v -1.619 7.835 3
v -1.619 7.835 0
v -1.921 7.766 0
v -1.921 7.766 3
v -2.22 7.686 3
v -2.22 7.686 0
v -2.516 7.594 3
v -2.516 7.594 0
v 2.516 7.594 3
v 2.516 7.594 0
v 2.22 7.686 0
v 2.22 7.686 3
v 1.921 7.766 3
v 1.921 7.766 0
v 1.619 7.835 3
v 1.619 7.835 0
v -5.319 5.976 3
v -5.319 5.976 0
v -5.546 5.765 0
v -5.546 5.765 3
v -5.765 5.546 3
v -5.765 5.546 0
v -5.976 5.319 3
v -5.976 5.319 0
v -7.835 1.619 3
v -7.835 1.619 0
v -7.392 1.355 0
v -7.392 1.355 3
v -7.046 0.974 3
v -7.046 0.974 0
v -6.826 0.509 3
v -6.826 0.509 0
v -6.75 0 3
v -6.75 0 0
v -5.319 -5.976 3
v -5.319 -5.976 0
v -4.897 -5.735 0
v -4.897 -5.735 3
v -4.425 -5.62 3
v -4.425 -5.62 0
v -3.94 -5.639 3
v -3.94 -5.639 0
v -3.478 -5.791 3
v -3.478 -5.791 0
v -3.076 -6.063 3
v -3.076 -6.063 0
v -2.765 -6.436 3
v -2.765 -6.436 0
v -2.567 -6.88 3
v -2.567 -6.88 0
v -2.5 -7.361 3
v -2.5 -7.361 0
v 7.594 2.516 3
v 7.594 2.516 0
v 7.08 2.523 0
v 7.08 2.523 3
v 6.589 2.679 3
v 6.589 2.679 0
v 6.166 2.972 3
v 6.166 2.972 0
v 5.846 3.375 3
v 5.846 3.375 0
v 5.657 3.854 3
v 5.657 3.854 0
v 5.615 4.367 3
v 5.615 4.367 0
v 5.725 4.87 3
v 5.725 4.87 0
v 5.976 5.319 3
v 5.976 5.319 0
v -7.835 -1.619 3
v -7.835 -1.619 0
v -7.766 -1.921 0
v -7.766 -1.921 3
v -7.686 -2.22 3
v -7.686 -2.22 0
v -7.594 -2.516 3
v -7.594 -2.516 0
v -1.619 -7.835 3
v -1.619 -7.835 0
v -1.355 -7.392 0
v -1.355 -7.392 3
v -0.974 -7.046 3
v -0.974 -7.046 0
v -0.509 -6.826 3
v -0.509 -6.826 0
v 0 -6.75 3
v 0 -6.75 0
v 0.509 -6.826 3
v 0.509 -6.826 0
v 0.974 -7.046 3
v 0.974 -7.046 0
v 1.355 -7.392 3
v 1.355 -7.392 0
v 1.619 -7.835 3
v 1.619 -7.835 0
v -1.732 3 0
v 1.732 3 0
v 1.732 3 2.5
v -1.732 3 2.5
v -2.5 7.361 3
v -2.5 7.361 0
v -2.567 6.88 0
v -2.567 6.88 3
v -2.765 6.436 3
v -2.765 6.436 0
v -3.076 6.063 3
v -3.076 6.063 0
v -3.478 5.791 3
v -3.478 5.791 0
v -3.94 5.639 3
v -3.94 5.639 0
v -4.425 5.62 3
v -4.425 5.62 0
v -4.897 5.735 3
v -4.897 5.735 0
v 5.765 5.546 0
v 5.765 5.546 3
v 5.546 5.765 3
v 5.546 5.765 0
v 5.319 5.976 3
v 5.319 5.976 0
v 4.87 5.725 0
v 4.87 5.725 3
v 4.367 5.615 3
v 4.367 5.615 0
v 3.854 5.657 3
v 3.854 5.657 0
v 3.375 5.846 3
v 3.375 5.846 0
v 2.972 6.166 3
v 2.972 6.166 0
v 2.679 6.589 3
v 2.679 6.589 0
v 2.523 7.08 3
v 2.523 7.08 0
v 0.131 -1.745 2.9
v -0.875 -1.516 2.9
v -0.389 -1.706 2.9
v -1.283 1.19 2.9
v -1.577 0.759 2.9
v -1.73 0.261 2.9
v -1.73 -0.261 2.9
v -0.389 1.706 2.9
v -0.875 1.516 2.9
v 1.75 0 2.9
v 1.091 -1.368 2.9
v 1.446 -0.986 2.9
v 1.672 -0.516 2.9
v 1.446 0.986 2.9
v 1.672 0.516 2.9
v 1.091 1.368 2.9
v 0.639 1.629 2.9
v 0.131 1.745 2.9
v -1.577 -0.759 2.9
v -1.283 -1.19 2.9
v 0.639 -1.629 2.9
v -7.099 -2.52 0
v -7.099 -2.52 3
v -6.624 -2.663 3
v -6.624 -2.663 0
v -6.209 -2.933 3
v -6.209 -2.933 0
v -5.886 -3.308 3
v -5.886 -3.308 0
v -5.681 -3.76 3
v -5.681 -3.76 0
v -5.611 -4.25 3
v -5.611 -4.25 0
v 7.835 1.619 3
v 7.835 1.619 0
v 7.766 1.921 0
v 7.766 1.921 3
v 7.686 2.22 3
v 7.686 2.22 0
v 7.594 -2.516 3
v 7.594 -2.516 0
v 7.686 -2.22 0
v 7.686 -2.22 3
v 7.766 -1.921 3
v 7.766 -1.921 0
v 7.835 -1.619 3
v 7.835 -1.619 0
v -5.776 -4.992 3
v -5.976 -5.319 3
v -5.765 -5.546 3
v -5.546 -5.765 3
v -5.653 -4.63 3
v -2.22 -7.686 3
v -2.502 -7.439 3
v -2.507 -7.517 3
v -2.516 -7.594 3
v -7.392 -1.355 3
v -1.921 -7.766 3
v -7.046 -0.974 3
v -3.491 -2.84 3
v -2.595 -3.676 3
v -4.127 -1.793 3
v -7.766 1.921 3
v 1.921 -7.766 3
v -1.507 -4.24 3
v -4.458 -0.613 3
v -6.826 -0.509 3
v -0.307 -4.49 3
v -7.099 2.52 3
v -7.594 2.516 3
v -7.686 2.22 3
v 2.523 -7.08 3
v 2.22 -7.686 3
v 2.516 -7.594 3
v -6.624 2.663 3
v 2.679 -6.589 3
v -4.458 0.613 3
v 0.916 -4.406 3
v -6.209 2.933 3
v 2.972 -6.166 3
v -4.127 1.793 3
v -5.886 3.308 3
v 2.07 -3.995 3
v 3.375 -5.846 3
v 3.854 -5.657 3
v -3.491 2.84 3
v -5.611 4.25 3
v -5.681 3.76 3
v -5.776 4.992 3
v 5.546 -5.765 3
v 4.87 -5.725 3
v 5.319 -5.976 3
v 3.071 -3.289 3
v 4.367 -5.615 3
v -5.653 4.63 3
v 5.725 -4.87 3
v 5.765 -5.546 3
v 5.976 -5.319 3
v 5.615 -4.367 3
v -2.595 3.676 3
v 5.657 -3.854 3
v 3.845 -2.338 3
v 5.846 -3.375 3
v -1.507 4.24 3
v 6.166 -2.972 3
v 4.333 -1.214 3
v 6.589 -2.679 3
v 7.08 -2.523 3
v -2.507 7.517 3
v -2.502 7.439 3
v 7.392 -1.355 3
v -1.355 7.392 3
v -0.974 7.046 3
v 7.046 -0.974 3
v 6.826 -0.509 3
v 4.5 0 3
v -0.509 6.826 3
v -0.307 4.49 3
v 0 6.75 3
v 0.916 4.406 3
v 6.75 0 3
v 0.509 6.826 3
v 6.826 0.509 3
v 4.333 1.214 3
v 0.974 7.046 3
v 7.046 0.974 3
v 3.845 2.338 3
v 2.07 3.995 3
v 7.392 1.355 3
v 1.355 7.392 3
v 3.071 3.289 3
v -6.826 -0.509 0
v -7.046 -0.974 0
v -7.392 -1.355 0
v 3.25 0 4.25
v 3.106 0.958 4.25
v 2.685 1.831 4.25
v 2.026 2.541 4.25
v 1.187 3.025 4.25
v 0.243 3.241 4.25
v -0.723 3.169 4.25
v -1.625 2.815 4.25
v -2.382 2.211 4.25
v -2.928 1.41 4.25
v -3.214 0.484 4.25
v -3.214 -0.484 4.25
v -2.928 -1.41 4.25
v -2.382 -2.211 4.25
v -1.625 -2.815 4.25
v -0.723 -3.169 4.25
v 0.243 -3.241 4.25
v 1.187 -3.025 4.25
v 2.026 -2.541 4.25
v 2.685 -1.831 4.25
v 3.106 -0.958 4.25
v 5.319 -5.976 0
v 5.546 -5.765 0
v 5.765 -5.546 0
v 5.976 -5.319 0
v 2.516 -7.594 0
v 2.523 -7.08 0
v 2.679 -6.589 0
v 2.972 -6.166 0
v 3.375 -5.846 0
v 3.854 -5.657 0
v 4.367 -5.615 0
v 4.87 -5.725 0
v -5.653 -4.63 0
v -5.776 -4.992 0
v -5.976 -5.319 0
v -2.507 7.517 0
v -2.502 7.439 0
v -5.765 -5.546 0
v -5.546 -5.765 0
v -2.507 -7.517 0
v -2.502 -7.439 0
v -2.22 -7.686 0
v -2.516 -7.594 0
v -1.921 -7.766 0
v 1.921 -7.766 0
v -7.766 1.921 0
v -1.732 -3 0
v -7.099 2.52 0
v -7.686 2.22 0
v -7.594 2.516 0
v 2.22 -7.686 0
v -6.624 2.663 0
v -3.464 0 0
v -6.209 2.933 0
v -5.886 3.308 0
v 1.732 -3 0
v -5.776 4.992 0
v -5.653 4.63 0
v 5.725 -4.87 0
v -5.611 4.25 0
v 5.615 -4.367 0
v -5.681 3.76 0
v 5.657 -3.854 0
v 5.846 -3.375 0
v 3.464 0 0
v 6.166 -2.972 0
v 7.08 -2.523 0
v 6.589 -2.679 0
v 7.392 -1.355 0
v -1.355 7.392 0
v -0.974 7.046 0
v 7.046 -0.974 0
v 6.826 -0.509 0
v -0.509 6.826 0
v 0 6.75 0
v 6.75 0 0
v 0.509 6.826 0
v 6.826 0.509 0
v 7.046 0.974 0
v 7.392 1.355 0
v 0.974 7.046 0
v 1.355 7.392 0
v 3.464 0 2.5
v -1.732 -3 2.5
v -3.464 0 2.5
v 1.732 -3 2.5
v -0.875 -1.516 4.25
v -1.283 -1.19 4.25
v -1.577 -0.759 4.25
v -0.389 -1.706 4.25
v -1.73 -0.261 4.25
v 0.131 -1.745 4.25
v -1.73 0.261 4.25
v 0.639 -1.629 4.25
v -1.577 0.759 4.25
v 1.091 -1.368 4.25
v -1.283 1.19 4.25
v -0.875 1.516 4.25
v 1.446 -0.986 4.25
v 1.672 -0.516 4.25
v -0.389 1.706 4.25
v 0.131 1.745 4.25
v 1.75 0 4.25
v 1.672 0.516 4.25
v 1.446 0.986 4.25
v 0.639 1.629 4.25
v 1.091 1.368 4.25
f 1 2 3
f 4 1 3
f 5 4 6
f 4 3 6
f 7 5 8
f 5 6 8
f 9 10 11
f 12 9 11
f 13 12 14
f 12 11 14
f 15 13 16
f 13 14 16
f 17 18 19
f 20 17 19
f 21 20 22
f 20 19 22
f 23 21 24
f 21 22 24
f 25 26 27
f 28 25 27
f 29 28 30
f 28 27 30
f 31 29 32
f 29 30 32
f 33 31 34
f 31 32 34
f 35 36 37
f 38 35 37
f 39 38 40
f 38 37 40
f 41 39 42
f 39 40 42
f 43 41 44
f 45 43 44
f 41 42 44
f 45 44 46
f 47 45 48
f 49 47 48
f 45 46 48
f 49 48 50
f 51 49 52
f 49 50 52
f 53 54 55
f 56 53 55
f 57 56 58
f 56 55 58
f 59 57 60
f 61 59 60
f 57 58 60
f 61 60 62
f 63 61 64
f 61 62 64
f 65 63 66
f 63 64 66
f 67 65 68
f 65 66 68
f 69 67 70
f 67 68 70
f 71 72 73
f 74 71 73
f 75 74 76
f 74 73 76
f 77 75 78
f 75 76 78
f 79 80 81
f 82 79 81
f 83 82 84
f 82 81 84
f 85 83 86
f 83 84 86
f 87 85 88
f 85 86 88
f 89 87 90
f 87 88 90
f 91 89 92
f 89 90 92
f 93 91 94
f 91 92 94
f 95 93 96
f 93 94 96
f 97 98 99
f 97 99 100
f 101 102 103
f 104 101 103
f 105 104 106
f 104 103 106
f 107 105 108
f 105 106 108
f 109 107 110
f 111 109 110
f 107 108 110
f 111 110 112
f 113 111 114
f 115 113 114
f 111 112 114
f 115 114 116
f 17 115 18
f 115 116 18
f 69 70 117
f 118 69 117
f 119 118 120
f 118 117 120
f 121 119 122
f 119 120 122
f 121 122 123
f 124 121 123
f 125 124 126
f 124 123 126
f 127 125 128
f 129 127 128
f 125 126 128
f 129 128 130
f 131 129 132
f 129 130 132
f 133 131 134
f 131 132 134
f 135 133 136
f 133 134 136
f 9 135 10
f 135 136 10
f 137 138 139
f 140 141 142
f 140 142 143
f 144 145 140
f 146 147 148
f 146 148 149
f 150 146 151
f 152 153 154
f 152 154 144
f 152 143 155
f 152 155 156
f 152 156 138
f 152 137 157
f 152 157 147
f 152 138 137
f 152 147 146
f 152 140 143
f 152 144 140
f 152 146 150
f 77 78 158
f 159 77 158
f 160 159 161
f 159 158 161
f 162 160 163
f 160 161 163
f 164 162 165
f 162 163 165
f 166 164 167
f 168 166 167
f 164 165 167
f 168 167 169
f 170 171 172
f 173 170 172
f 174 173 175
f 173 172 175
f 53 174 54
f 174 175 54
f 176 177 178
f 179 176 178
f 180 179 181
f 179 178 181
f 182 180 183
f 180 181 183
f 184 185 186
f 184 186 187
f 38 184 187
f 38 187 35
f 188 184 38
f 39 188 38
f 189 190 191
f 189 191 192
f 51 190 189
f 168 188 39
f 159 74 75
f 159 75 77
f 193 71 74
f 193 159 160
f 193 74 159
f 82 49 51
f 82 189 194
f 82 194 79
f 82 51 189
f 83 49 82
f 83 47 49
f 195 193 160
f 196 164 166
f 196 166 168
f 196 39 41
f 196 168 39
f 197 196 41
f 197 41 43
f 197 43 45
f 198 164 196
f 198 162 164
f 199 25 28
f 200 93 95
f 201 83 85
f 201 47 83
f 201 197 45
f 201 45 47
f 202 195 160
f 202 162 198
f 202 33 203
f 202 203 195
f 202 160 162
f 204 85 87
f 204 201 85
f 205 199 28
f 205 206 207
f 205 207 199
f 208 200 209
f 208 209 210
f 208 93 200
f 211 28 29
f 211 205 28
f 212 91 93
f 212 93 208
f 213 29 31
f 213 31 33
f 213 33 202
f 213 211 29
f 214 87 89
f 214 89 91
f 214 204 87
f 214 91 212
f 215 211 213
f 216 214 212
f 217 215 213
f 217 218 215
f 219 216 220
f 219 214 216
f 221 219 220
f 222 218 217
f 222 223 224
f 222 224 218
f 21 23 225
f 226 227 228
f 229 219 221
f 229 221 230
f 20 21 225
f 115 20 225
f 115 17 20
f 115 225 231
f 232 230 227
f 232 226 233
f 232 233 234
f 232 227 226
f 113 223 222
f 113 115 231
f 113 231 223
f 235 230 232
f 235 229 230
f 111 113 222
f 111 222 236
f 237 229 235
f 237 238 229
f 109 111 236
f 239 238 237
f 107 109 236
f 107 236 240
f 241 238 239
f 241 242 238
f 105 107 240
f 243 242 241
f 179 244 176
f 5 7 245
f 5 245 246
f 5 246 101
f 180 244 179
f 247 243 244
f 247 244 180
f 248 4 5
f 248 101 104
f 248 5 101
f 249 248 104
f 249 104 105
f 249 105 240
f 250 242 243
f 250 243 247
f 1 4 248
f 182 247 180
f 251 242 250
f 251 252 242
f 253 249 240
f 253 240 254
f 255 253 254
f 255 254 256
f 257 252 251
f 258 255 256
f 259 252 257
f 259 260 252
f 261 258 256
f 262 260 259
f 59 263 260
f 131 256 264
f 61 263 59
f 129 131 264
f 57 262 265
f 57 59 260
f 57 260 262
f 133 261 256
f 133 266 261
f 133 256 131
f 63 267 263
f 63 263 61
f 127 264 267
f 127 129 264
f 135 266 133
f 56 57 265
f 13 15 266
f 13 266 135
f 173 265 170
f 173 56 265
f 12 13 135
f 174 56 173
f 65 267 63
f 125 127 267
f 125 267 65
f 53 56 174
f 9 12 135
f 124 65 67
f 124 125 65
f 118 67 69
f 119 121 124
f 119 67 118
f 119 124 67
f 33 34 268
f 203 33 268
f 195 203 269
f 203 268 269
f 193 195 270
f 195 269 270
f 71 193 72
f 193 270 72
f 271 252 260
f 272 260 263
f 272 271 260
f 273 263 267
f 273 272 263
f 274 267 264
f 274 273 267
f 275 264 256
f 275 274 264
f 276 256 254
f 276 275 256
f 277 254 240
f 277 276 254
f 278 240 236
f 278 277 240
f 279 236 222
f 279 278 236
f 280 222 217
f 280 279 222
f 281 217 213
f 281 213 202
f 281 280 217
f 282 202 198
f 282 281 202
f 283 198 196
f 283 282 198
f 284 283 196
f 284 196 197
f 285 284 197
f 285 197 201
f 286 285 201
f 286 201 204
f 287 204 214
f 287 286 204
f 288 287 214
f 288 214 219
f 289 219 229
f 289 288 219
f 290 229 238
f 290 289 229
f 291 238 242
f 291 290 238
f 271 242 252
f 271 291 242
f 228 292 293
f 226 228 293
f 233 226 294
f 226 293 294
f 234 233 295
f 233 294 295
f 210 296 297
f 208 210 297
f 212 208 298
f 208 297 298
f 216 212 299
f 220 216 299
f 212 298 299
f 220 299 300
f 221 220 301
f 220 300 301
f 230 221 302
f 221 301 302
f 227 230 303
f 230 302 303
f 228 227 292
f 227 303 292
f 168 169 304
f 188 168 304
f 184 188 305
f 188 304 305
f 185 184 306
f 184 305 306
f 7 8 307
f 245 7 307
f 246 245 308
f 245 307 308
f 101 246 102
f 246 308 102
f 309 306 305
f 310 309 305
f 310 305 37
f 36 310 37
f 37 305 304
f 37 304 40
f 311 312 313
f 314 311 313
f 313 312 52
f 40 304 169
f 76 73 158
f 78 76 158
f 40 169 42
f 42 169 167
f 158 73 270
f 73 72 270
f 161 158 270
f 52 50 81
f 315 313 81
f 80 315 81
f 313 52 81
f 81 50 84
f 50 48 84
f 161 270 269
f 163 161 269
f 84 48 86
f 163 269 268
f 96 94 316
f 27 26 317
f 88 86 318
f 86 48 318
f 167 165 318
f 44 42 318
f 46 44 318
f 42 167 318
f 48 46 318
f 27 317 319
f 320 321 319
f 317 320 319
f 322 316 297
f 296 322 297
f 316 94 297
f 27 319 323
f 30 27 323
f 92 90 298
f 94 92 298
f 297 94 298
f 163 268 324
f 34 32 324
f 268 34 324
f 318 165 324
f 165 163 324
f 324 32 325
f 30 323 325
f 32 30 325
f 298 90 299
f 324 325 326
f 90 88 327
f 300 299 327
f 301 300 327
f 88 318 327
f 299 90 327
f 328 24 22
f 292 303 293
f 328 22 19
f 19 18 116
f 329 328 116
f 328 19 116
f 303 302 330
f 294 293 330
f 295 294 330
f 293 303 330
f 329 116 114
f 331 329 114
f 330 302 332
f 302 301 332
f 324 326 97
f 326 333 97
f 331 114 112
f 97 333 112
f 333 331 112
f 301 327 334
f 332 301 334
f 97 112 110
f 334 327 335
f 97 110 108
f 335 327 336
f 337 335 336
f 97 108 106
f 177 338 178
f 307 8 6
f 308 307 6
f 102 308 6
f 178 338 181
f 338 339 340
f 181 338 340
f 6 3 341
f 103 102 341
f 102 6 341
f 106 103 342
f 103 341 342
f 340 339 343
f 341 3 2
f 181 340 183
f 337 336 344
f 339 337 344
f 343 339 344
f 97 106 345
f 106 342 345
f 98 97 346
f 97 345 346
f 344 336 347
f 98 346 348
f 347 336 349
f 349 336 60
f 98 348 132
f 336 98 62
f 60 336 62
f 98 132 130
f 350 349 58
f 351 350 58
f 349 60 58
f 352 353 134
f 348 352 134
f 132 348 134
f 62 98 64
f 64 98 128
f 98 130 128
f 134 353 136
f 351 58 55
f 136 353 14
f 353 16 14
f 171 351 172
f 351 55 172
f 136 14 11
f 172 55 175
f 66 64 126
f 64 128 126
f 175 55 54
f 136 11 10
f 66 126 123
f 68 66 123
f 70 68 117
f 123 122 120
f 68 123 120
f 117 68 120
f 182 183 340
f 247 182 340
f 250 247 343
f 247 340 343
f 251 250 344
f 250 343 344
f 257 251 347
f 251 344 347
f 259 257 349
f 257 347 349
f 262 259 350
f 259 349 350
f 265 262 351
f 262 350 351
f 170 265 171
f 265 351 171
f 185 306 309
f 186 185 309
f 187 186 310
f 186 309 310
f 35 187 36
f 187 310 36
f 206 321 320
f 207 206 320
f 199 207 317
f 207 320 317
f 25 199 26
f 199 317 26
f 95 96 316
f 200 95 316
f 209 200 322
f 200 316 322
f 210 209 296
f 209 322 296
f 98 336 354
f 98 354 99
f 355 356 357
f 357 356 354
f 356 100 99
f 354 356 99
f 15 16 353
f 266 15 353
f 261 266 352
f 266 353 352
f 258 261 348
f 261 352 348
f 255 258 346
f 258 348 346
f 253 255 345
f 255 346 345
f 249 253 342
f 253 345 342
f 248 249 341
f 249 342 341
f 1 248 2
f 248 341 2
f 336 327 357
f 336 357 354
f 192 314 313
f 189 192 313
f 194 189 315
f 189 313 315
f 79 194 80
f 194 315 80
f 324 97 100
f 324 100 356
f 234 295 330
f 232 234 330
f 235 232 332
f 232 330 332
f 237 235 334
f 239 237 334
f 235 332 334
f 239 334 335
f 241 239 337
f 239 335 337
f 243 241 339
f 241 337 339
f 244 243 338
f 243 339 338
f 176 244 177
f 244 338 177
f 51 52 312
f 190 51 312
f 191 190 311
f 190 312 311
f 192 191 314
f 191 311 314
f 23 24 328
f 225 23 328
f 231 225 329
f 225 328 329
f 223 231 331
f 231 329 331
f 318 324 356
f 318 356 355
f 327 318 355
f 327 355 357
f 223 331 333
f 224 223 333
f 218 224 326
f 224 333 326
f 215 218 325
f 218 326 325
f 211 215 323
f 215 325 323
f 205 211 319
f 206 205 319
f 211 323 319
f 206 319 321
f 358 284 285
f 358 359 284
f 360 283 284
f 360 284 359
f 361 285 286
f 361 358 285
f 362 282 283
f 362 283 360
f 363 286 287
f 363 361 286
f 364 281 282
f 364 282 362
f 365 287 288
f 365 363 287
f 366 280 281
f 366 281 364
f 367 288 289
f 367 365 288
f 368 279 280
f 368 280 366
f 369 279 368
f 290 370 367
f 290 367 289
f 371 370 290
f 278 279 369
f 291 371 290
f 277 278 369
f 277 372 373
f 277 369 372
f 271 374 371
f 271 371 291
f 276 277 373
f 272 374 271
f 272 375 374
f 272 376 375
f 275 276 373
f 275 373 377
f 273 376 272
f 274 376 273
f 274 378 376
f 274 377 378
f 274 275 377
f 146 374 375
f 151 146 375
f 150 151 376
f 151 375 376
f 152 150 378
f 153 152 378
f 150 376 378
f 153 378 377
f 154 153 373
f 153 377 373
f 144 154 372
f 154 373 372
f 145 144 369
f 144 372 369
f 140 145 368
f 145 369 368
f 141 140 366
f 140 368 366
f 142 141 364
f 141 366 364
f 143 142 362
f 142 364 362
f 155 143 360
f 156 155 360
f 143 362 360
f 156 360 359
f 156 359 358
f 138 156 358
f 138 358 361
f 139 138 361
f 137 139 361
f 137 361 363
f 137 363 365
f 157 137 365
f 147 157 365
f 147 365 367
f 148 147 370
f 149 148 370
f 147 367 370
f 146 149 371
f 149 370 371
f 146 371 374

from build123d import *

# Parameters (mm, degrees)
F1_DEPTH = 3
F2_DEPTH = 2.5
F3_R     = 4.5
F4_DEPTH = 1.25
F6_SIZE  = 1.24999
F5_R     = 1.75
F7_DEPTH = 1.35


# Not quite as in the source:
# - a fillet or chamfer is up to 0.001 mm smaller than in the source, because OpenCascade refuses the exact size


with BuildPart() as f1:
    # F0 (on Top) → F1 (new body)
    with BuildSketch(Plane.XY):
        with BuildLine():
            ThreePointArc((7.8345588235, -1.6185450382), (6.75, 0), (7.8345588235, 1.6185450382))
            ThreePointArc((7.8345588235, 1.6185450382), (7.7274066103, 2.0705523608), (7.5941994877, 2.5155782915))
            ThreePointArc((7.5941994877, 2.5155782915), (5.8456714755, 3.375), (5.9756544495, 5.318980532))
            ThreePointArc((5.9756544495, 5.318980532), (5.6568542495, 5.6568542495), (5.318980532, 5.9756544495))
            ThreePointArc((5.318980532, 5.9756544495), (3.375, 5.8456714755), (2.5155782915, 7.5941994877))
            ThreePointArc((2.5155782915, 7.5941994877), (2.0705523608, 7.7274066103), (1.6185450382, 7.8345588235))
            ThreePointArc((1.6185450382, 7.8345588235), (0, 6.75), (-1.6185450382, 7.8345588235))
            ThreePointArc((-1.6185450382, 7.8345588235), (-2.0705523608, 7.7274066103), (-2.5155782915, 7.5941994877))
            ThreePointArc((-2.5155782915, 7.5941994877), (-2.5038989162, 7.4779678276), (-2.5, 7.3612159322))
            ThreePointArc((-2.5, 7.3612159322), (-3.4780595655, 5.7906720883), (-5.318980532, 5.9756544495))
            ThreePointArc((-5.318980532, 5.9756544495), (-5.6568542495, 5.6568542495), (-5.9756544495, 5.318980532))
            ThreePointArc((-5.9756544495, 5.318980532), (-5.7048294141, 4.8146978862), (-5.6112159322, 4.25))
            ThreePointArc((-5.6112159322, 4.25), (-6.2090920721, 2.932764026), (-7.5941994877, 2.5155782915))
            ThreePointArc((-7.5941994877, 2.5155782915), (-7.7274066103, 2.0705523608), (-7.8345588235, 1.6185450382))
            ThreePointArc((-7.8345588235, 1.6185450382), (-7.0462080515, 0.9741606493), (-6.75, 0))
            ThreePointArc((-6.75, 0), (-7.0462080515, -0.9741606493), (-7.8345588235, -1.6185450382))
            ThreePointArc((-7.8345588235, -1.6185450382), (-7.7274066103, -2.0705523608), (-7.5941994877, -2.5155782915))
            ThreePointArc((-7.5941994877, -2.5155782915), (-6.2090920721, -2.932764026), (-5.6112159322, -4.25))
            ThreePointArc((-5.6112159322, -4.25), (-5.7048294141, -4.8146978862), (-5.9756544495, -5.318980532))
            ThreePointArc((-5.9756544495, -5.318980532), (-5.6568542495, -5.6568542495), (-5.318980532, -5.9756544495))
            ThreePointArc((-5.318980532, -5.9756544495), (-3.4780595655, -5.7906720883), (-2.5, -7.3612159322))
            ThreePointArc((-2.5, -7.3612159322), (-2.5038989162, -7.4779678276), (-2.5155782915, -7.5941994877))
            ThreePointArc((-2.5155782915, -7.5941994877), (-2.0705523608, -7.7274066103), (-1.6185450382, -7.8345588235))
            ThreePointArc((-1.6185450382, -7.8345588235), (0, -6.75), (1.6185450382, -7.8345588235))
            ThreePointArc((1.6185450382, -7.8345588235), (2.0705523608, -7.7274066103), (2.5155782915, -7.5941994877))
            ThreePointArc((2.5155782915, -7.5941994877), (3.375, -5.8456714755), (5.318980532, -5.9756544495))
            ThreePointArc((5.318980532, -5.9756544495), (5.6568542495, -5.6568542495), (5.9756544495, -5.318980532))
            ThreePointArc((5.9756544495, -5.318980532), (5.8456714755, -3.375), (7.5941994877, -2.5155782915))
            ThreePointArc((7.5941994877, -2.5155782915), (7.7274066103, -2.0705523608), (7.8345588235, -1.6185450382))
        make_face()
        Polygon((3.4641016151, 0), (1.7320508076, -3), (-1.7320508076, -3), (-3.4641016151, 0), (-1.7320508076, 3), (1.7320508076, 3), align=None, mode=Mode.SUBTRACT)
        Polygon((-1.7320508076, -3), (1.7320508076, -3), (3.4641016151, 0), (1.7320508076, 3), (-1.7320508076, 3), (-3.4641016151, 0), align=None)
    extrude(amount=F1_DEPTH)

    # F0 (on Top) → F2 (cut)
    with BuildSketch(Plane.XY):
        Polygon((-1.7320508076, -3), (1.7320508076, -3), (3.4641016151, 0), (1.7320508076, 3), (-1.7320508076, 3), (-3.4641016151, 0), align=None)
    extrude(amount=F2_DEPTH, mode=Mode.SUBTRACT)

    # F3 (on face) → F4 (join)
    with BuildSketch(Plane.XY.offset(3)):
        Circle(F3_R)
    extrude(amount=F4_DEPTH)

    # F6 (size 1.25 in the source; OpenCascade refuses exactly that, so slightly less here)
    f6_edges = [f1.edges().sort_by_distance(p)[0] for p in [
        (-4.5, 0, 4.25),
    ]]
    chamfer(f6_edges, length=F6_SIZE)

    # F5 (on face) → F7 (cut)
    with BuildSketch(Plane.XY.offset(4.25)):
        Circle(F5_R)
    extrude(amount=-F7_DEPTH, mode=Mode.SUBTRACT)


solid = f1.part
